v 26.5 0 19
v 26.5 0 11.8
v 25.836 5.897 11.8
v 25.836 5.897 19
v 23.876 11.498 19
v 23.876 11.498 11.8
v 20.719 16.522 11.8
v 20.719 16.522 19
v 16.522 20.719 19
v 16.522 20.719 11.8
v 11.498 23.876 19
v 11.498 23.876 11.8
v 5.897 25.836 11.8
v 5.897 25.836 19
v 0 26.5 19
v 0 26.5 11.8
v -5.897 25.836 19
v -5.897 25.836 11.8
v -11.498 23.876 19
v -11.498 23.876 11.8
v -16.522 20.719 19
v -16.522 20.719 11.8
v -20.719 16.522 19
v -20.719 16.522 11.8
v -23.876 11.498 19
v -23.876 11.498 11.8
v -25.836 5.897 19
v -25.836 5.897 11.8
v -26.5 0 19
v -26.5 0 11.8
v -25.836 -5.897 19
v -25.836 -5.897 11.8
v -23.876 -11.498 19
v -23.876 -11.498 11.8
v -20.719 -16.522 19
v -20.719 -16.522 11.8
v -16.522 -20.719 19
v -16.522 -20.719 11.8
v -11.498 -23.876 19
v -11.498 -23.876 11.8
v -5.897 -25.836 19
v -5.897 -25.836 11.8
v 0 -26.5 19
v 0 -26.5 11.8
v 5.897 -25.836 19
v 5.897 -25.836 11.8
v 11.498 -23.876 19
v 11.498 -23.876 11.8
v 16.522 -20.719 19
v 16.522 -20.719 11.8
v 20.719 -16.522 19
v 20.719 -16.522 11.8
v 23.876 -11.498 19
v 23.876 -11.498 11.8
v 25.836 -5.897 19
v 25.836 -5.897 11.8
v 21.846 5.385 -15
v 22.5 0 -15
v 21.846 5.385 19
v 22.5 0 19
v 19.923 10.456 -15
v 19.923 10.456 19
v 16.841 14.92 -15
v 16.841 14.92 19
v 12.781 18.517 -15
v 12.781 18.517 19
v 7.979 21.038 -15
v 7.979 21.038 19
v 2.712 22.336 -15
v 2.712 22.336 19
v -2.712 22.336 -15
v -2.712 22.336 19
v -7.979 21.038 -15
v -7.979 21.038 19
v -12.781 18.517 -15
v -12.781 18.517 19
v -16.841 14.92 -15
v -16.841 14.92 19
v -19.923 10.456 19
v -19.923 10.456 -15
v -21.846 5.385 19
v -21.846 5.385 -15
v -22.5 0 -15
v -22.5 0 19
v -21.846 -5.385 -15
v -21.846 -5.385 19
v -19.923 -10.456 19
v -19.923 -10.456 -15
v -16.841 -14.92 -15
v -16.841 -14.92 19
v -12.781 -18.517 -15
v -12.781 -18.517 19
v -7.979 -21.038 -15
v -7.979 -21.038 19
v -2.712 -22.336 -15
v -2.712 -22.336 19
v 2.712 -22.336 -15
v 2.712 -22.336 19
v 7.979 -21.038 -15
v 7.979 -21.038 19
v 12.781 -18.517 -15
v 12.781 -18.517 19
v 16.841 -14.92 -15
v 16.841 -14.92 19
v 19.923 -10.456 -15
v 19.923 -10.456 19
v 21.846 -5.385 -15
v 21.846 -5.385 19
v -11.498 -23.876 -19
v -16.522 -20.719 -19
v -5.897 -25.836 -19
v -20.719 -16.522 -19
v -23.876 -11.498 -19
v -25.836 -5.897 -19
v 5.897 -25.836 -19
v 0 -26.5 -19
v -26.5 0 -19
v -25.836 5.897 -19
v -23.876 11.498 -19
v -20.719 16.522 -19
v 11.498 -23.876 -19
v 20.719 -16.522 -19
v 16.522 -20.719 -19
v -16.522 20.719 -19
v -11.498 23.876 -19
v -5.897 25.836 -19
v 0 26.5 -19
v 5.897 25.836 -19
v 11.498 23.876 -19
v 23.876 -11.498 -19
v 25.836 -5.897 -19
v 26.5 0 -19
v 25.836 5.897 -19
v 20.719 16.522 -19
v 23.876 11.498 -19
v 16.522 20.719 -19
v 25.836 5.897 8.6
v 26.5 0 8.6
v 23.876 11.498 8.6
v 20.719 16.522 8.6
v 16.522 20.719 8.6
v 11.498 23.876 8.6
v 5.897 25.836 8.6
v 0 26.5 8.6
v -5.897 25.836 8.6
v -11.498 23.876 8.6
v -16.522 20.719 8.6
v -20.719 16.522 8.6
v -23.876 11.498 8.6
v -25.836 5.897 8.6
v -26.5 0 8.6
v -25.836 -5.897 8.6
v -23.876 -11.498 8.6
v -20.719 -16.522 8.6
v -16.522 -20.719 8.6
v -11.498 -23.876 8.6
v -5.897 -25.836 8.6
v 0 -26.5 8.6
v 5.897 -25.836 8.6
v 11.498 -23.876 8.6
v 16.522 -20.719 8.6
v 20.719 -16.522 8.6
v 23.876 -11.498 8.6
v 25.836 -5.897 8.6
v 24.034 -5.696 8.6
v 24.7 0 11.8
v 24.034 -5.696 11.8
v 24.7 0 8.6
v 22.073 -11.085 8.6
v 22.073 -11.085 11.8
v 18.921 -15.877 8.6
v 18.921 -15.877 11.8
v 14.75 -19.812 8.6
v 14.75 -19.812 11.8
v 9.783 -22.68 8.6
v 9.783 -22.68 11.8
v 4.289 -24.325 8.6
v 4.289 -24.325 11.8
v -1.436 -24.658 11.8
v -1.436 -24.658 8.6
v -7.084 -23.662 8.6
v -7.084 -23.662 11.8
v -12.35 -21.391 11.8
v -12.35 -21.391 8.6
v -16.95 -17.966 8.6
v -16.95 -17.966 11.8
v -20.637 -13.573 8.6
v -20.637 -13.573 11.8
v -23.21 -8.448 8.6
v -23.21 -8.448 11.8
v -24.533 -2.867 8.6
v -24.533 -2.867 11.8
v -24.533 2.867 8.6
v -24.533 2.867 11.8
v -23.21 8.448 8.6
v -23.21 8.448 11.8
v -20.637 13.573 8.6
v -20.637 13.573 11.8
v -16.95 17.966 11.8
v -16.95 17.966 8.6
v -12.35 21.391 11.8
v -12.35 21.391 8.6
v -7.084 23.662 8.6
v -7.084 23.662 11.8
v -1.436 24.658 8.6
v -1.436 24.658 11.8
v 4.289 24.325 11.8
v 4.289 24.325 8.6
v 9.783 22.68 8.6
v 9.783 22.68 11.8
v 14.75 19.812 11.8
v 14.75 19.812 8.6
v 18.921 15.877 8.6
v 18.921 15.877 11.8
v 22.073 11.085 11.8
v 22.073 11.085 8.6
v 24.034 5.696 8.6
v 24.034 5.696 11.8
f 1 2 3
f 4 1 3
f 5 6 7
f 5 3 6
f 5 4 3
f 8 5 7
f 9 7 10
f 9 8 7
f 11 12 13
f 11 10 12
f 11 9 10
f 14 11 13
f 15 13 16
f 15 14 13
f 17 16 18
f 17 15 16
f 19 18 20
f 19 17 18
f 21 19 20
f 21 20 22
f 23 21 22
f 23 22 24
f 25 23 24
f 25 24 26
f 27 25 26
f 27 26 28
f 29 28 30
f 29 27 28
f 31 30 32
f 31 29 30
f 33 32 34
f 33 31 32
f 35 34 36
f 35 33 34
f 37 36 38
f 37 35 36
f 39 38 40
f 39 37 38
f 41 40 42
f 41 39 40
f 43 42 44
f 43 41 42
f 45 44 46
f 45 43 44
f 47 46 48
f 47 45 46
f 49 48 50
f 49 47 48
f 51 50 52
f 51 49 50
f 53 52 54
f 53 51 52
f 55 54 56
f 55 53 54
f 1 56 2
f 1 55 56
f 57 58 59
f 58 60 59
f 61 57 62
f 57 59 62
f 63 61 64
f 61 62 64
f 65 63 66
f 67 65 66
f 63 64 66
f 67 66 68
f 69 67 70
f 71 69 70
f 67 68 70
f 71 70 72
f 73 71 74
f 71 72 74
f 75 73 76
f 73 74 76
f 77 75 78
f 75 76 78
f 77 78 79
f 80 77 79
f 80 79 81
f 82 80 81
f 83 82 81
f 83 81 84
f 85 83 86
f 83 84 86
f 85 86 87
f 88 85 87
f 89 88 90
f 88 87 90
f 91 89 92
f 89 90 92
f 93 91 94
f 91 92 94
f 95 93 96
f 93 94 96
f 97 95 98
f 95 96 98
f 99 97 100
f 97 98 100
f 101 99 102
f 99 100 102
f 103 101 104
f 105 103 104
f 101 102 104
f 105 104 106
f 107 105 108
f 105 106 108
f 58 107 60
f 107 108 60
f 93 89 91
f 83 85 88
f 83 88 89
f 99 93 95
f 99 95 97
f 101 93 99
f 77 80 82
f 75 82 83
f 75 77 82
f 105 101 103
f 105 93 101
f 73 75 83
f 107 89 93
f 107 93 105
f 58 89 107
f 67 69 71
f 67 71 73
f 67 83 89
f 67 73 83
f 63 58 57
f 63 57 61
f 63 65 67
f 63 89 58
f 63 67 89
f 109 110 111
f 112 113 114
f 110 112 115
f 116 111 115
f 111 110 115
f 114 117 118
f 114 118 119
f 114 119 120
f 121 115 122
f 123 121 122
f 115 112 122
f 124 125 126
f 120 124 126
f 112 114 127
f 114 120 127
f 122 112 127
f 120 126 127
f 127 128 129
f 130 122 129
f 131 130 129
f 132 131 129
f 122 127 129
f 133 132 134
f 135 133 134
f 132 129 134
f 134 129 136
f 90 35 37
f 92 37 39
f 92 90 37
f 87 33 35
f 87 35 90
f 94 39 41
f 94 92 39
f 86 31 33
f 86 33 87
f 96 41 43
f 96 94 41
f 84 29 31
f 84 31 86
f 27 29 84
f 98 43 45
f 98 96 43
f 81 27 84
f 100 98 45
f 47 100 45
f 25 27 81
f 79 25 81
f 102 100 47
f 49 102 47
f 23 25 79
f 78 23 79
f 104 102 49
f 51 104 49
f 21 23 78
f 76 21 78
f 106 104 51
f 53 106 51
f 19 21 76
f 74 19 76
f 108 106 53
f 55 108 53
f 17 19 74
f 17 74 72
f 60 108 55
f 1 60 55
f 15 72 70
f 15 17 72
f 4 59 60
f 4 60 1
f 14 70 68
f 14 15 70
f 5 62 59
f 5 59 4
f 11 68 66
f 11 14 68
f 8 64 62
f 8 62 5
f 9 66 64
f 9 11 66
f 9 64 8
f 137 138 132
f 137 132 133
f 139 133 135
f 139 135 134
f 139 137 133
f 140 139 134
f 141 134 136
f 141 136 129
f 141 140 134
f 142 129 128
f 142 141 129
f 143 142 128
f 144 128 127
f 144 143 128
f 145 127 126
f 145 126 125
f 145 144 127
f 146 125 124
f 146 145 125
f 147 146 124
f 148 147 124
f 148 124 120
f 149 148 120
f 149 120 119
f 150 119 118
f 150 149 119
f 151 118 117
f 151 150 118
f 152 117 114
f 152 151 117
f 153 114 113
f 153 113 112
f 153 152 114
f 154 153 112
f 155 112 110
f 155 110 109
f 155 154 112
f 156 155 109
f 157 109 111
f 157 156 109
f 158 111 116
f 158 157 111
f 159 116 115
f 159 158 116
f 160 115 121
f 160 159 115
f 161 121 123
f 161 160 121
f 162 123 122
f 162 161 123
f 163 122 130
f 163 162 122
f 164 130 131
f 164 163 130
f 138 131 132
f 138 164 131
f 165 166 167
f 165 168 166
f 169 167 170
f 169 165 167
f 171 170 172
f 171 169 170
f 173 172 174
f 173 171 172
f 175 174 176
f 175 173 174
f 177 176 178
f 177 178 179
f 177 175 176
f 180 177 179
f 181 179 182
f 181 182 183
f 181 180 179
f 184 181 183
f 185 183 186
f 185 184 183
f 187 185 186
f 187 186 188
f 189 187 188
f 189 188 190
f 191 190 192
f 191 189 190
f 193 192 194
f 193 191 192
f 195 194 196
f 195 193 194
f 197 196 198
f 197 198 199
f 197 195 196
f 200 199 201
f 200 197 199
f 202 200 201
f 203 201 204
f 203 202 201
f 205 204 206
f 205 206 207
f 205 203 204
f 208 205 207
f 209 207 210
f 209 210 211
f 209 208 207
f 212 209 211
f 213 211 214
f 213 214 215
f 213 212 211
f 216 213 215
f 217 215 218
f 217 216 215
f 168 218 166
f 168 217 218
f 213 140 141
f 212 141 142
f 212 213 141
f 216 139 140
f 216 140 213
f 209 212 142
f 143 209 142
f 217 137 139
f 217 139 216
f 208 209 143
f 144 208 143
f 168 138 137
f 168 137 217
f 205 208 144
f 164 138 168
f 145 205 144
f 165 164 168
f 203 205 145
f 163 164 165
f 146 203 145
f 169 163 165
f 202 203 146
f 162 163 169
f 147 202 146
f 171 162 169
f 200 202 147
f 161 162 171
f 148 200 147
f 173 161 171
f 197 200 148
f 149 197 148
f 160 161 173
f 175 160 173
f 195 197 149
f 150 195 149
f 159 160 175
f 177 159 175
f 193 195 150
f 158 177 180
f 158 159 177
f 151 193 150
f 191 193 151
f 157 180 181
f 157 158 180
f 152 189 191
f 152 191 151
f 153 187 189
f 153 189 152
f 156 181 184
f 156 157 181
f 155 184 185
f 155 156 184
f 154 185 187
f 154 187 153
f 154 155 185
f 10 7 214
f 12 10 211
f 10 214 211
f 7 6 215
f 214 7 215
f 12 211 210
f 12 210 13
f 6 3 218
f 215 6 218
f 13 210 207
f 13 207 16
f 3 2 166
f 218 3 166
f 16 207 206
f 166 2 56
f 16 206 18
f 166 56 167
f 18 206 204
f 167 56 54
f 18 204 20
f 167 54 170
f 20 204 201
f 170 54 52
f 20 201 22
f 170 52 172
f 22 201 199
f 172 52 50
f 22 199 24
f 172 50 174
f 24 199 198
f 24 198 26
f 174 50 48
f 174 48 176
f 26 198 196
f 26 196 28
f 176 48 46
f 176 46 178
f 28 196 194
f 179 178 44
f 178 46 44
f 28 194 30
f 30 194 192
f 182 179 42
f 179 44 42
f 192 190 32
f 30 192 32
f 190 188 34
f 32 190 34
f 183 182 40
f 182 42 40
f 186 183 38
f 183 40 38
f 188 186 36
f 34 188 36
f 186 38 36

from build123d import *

# Parameters (mm, degrees)
SKETCH1_R           = 26.5
BOSS_EXTRUDE1_DEPTH = 19
SHELL1_T            = -4
SKETCH3_W           = 1.8
SKETCH3_H           = 3.2


with BuildPart() as part:
    # Sketch1 → Boss-Extrude1 (new, symmetric)
    with BuildSketch(Plane.XY):
        Circle(SKETCH1_R)
    extrude(amount=BOSS_EXTRUDE1_DEPTH, both=True)

    # Shell1
    shell1_openings = [part.faces().sort_by_distance(p)[0] for p in [
        (0, 0, 19),
    ]]
    offset(amount=SHELL1_T, openings=shell1_openings, kind=Kind.INTERSECTION)

    # Sketch3 → Cut-Revolve1 (revolve, cut)
    with BuildSketch(Plane(origin=(0, 0, 0), x_dir=(1, 0, 0), z_dir=(0, 1, 0))):
        with Locations((25.6, -10.2)):
            Rectangle(SKETCH3_W, SKETCH3_H)
    revolve(axis=Axis((0, 0, 19), (0, 0, -1)), mode=Mode.SUBTRACT)


solid = part.part
